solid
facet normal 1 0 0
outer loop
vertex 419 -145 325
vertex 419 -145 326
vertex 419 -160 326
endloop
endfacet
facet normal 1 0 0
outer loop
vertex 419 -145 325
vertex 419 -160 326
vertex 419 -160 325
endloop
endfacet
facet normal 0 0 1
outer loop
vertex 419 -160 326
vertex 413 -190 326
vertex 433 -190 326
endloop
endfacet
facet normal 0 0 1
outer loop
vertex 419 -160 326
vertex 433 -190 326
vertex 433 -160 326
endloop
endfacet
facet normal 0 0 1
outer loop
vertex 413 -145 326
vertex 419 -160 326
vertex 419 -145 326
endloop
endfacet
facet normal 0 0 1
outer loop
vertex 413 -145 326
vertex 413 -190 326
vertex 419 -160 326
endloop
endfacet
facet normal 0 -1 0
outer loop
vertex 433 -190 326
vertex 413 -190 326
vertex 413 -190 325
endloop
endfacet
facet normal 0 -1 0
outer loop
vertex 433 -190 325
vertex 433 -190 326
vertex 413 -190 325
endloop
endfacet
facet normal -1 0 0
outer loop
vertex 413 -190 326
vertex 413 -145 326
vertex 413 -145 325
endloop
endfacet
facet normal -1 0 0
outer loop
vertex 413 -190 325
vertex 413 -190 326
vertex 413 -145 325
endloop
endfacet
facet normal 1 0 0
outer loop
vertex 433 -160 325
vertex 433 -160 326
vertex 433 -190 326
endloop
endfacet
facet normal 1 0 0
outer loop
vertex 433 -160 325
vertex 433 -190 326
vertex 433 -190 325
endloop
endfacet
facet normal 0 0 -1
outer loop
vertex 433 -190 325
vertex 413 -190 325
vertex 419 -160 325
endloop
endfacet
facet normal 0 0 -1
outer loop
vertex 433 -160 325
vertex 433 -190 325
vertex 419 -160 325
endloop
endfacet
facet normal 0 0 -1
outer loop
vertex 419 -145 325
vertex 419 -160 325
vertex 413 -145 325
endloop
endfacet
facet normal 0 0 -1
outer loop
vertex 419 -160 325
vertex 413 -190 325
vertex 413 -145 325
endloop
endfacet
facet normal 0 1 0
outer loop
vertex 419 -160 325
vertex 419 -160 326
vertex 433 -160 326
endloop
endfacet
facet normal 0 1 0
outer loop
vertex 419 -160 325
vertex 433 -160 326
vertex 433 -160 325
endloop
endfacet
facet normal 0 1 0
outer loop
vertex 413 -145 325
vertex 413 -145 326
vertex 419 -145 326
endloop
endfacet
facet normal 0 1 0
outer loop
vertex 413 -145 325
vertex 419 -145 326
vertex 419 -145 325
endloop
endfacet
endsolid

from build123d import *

# Parameters (mm, degrees)
BOX007_W           = 10
BOX007_H           = 15
BOX007_DEPTH       = 14
BOX006_W           = 1
BOX006_H           = 45
BOX006_DEPTH       = 20
CUT006_PITCH_ANGLE = 90


with BuildPart() as cubo005:
    # Box007 → Box007 (new body)
    with BuildSketch(Plane(origin=(-4, -227, 60), x_dir=(1, 0, 0), z_dir=(0, 0, 1))):
        with Locations((5, 7.5)):
            Rectangle(BOX007_W, BOX007_H)
    extrude(amount=BOX007_DEPTH)


with BuildPart() as cut006:
    # Box006 → Box006 (new body)
    with BuildSketch(Plane(origin=(0, -257, 54), x_dir=(1, 0, 0), z_dir=(0, 0, 1))):
        with Locations((0.5, 22.5)):
            Rectangle(BOX006_W, BOX006_H)
    extrude(amount=BOX006_DEPTH)

    # Cut006: cut Cubo005
    add(cubo005.part, mode=Mode.SUBTRACT)


with BuildPart() as cut006_1:
    # Cut006 pitch: moved
    add(cut006.part.rotate(Axis((0, 0, 0), (0, 1, 0)), CUT006_PITCH_ANGLE))


with BuildPart() as cut006_2:
    # Cut006 placement: moved
    add(cut006_1.part.moved(Location((359, 67, 326))))


solid = cut006_2.part
